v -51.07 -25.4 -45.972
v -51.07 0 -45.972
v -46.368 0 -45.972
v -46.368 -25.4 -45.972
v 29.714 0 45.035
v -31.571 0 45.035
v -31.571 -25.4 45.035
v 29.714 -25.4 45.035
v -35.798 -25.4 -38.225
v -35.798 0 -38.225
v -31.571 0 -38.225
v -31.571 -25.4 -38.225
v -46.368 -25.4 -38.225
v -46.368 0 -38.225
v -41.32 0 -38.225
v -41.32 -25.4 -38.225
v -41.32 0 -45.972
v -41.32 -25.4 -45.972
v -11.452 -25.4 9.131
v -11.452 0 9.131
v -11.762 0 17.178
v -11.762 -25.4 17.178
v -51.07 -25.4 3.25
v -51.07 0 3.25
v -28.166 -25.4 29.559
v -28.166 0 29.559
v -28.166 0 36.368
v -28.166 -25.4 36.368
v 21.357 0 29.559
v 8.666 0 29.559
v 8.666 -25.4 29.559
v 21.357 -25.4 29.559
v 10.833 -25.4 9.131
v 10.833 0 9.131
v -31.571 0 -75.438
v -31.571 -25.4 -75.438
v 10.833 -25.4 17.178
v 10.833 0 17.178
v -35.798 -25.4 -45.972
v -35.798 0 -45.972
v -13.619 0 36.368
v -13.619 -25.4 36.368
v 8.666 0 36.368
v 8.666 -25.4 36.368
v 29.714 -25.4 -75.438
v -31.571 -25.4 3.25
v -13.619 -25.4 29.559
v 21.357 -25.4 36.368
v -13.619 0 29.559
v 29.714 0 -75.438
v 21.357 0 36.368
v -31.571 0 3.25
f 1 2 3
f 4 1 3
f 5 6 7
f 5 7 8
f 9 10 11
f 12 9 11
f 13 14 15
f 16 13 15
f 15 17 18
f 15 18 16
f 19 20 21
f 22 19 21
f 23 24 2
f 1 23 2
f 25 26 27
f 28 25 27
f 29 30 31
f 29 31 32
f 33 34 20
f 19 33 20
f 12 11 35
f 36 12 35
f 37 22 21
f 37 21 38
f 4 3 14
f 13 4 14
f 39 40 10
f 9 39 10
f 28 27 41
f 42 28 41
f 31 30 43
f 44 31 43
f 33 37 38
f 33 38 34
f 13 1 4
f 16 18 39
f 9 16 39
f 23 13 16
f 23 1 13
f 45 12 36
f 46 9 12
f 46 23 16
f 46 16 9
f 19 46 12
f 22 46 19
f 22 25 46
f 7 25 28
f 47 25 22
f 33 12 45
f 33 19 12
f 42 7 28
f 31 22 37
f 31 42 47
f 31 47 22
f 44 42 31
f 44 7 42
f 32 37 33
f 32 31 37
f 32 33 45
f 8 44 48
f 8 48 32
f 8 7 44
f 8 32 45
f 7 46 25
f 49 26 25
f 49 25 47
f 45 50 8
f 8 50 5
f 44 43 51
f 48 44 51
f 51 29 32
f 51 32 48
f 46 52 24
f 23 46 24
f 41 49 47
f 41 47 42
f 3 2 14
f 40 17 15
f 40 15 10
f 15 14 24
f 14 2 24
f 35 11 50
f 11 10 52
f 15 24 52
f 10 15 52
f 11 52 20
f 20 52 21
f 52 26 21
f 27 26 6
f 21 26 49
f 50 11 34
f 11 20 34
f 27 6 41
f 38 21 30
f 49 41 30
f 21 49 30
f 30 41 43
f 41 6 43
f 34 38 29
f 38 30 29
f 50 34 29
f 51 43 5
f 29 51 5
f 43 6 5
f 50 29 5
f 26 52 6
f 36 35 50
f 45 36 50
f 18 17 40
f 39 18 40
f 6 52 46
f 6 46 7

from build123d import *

# Parameters (mm, degrees)
F0_W     = 31.5706767142
F0_H     = 27.2374488413
F0_H_2   = 9.9748745561
F0_W_2   = 61.2842533737
F0_H_3   = 41.7847204953
F0_W_3   = 14.5472735167
F0_H_4   = 6.8093631417
F0_W_4   = 12.6901743934
F0_W_5   = 4.7026574612
F0_H_5   = 7.7468082309
F0_W_6   = 5.5220406502
F1_DEPTH = 25.4


with BuildPart() as f1:
    # F0 (on Front) → F1 (new body)
    with BuildSketch(Plane.XZ):
        Polygon((29.7135766596, -38.2252819836), (29.7135766596, 3.2499227673), (-31.5706767142, 3.2499227673), (-31.5706767142, -38.2252819836), (0, -38.2252819836), align=None)
        Polygon((-31.5706767142, -38.2252819836), (-31.5706767142, 3.2499227673), (-51.0702133179, 3.2499227673), (-51.0702133179, -38.2252819836), (-46.3675558567, -38.2252819836), (-41.320445016, -38.2252819836), (-35.7984043658, -38.2252819836), align=None)
        Polygon((29.7135766596, -65.4627308249), (29.7135766596, -38.2252819836), (0, -38.2252819836), (0, -65.4627308249), (2.1666167304, -65.4627308249), align=None)
        with Locations((-15.7853383571, -51.8440064043)):
            Rectangle(F0_W, F0_H)
        Polygon((29.7135766596, -75.437605381), (29.7135766596, -65.4627308249), (2.1666167304, -65.4627308249), (0, -65.4627308249), (0, -75.437605381), align=None)
        with Locations((-15.7853383571, -70.450168103)):
            Rectangle(F0_W, F0_H_2)
        with Locations((-0.9285500273, 24.142283015)):
            Rectangle(F0_W_2, F0_H_3)
        with Locations((-20.8923593163, 32.9635022208)):
            Rectangle(F0_W_3, F0_H_4, mode=Mode.SUBTRACT)
        Polygon((-11.4521086216, 9.1307349503), (-11.761624366, 17.1781629324), (-7.1188774891, 17.1781629324), (-3.7141975481, 17.1781629324), (0, 17.1781629324), (5.2617802285, 17.1781629324), (10.8330752701, 17.1781629324), (10.8330752701, 9.1307349503), (5.2617802285, 9.1307349503), (0, 9.1307349503), (-3.7141975481, 9.1307349503), (-7.1188774891, 9.1307349503), align=None, mode=Mode.SUBTRACT)
        with Locations((15.011547599, 32.9635022208)):
            Rectangle(F0_W_4, F0_H_4, mode=Mode.SUBTRACT)
        with Locations((-48.7188845873, -42.0986860991)):
            Rectangle(F0_W_5, F0_H_5)
        with Locations((-38.5594246909, -42.0986860991)):
            Rectangle(F0_W_6, F0_H_5)
    extrude(amount=F1_DEPTH)


solid = f1.part
